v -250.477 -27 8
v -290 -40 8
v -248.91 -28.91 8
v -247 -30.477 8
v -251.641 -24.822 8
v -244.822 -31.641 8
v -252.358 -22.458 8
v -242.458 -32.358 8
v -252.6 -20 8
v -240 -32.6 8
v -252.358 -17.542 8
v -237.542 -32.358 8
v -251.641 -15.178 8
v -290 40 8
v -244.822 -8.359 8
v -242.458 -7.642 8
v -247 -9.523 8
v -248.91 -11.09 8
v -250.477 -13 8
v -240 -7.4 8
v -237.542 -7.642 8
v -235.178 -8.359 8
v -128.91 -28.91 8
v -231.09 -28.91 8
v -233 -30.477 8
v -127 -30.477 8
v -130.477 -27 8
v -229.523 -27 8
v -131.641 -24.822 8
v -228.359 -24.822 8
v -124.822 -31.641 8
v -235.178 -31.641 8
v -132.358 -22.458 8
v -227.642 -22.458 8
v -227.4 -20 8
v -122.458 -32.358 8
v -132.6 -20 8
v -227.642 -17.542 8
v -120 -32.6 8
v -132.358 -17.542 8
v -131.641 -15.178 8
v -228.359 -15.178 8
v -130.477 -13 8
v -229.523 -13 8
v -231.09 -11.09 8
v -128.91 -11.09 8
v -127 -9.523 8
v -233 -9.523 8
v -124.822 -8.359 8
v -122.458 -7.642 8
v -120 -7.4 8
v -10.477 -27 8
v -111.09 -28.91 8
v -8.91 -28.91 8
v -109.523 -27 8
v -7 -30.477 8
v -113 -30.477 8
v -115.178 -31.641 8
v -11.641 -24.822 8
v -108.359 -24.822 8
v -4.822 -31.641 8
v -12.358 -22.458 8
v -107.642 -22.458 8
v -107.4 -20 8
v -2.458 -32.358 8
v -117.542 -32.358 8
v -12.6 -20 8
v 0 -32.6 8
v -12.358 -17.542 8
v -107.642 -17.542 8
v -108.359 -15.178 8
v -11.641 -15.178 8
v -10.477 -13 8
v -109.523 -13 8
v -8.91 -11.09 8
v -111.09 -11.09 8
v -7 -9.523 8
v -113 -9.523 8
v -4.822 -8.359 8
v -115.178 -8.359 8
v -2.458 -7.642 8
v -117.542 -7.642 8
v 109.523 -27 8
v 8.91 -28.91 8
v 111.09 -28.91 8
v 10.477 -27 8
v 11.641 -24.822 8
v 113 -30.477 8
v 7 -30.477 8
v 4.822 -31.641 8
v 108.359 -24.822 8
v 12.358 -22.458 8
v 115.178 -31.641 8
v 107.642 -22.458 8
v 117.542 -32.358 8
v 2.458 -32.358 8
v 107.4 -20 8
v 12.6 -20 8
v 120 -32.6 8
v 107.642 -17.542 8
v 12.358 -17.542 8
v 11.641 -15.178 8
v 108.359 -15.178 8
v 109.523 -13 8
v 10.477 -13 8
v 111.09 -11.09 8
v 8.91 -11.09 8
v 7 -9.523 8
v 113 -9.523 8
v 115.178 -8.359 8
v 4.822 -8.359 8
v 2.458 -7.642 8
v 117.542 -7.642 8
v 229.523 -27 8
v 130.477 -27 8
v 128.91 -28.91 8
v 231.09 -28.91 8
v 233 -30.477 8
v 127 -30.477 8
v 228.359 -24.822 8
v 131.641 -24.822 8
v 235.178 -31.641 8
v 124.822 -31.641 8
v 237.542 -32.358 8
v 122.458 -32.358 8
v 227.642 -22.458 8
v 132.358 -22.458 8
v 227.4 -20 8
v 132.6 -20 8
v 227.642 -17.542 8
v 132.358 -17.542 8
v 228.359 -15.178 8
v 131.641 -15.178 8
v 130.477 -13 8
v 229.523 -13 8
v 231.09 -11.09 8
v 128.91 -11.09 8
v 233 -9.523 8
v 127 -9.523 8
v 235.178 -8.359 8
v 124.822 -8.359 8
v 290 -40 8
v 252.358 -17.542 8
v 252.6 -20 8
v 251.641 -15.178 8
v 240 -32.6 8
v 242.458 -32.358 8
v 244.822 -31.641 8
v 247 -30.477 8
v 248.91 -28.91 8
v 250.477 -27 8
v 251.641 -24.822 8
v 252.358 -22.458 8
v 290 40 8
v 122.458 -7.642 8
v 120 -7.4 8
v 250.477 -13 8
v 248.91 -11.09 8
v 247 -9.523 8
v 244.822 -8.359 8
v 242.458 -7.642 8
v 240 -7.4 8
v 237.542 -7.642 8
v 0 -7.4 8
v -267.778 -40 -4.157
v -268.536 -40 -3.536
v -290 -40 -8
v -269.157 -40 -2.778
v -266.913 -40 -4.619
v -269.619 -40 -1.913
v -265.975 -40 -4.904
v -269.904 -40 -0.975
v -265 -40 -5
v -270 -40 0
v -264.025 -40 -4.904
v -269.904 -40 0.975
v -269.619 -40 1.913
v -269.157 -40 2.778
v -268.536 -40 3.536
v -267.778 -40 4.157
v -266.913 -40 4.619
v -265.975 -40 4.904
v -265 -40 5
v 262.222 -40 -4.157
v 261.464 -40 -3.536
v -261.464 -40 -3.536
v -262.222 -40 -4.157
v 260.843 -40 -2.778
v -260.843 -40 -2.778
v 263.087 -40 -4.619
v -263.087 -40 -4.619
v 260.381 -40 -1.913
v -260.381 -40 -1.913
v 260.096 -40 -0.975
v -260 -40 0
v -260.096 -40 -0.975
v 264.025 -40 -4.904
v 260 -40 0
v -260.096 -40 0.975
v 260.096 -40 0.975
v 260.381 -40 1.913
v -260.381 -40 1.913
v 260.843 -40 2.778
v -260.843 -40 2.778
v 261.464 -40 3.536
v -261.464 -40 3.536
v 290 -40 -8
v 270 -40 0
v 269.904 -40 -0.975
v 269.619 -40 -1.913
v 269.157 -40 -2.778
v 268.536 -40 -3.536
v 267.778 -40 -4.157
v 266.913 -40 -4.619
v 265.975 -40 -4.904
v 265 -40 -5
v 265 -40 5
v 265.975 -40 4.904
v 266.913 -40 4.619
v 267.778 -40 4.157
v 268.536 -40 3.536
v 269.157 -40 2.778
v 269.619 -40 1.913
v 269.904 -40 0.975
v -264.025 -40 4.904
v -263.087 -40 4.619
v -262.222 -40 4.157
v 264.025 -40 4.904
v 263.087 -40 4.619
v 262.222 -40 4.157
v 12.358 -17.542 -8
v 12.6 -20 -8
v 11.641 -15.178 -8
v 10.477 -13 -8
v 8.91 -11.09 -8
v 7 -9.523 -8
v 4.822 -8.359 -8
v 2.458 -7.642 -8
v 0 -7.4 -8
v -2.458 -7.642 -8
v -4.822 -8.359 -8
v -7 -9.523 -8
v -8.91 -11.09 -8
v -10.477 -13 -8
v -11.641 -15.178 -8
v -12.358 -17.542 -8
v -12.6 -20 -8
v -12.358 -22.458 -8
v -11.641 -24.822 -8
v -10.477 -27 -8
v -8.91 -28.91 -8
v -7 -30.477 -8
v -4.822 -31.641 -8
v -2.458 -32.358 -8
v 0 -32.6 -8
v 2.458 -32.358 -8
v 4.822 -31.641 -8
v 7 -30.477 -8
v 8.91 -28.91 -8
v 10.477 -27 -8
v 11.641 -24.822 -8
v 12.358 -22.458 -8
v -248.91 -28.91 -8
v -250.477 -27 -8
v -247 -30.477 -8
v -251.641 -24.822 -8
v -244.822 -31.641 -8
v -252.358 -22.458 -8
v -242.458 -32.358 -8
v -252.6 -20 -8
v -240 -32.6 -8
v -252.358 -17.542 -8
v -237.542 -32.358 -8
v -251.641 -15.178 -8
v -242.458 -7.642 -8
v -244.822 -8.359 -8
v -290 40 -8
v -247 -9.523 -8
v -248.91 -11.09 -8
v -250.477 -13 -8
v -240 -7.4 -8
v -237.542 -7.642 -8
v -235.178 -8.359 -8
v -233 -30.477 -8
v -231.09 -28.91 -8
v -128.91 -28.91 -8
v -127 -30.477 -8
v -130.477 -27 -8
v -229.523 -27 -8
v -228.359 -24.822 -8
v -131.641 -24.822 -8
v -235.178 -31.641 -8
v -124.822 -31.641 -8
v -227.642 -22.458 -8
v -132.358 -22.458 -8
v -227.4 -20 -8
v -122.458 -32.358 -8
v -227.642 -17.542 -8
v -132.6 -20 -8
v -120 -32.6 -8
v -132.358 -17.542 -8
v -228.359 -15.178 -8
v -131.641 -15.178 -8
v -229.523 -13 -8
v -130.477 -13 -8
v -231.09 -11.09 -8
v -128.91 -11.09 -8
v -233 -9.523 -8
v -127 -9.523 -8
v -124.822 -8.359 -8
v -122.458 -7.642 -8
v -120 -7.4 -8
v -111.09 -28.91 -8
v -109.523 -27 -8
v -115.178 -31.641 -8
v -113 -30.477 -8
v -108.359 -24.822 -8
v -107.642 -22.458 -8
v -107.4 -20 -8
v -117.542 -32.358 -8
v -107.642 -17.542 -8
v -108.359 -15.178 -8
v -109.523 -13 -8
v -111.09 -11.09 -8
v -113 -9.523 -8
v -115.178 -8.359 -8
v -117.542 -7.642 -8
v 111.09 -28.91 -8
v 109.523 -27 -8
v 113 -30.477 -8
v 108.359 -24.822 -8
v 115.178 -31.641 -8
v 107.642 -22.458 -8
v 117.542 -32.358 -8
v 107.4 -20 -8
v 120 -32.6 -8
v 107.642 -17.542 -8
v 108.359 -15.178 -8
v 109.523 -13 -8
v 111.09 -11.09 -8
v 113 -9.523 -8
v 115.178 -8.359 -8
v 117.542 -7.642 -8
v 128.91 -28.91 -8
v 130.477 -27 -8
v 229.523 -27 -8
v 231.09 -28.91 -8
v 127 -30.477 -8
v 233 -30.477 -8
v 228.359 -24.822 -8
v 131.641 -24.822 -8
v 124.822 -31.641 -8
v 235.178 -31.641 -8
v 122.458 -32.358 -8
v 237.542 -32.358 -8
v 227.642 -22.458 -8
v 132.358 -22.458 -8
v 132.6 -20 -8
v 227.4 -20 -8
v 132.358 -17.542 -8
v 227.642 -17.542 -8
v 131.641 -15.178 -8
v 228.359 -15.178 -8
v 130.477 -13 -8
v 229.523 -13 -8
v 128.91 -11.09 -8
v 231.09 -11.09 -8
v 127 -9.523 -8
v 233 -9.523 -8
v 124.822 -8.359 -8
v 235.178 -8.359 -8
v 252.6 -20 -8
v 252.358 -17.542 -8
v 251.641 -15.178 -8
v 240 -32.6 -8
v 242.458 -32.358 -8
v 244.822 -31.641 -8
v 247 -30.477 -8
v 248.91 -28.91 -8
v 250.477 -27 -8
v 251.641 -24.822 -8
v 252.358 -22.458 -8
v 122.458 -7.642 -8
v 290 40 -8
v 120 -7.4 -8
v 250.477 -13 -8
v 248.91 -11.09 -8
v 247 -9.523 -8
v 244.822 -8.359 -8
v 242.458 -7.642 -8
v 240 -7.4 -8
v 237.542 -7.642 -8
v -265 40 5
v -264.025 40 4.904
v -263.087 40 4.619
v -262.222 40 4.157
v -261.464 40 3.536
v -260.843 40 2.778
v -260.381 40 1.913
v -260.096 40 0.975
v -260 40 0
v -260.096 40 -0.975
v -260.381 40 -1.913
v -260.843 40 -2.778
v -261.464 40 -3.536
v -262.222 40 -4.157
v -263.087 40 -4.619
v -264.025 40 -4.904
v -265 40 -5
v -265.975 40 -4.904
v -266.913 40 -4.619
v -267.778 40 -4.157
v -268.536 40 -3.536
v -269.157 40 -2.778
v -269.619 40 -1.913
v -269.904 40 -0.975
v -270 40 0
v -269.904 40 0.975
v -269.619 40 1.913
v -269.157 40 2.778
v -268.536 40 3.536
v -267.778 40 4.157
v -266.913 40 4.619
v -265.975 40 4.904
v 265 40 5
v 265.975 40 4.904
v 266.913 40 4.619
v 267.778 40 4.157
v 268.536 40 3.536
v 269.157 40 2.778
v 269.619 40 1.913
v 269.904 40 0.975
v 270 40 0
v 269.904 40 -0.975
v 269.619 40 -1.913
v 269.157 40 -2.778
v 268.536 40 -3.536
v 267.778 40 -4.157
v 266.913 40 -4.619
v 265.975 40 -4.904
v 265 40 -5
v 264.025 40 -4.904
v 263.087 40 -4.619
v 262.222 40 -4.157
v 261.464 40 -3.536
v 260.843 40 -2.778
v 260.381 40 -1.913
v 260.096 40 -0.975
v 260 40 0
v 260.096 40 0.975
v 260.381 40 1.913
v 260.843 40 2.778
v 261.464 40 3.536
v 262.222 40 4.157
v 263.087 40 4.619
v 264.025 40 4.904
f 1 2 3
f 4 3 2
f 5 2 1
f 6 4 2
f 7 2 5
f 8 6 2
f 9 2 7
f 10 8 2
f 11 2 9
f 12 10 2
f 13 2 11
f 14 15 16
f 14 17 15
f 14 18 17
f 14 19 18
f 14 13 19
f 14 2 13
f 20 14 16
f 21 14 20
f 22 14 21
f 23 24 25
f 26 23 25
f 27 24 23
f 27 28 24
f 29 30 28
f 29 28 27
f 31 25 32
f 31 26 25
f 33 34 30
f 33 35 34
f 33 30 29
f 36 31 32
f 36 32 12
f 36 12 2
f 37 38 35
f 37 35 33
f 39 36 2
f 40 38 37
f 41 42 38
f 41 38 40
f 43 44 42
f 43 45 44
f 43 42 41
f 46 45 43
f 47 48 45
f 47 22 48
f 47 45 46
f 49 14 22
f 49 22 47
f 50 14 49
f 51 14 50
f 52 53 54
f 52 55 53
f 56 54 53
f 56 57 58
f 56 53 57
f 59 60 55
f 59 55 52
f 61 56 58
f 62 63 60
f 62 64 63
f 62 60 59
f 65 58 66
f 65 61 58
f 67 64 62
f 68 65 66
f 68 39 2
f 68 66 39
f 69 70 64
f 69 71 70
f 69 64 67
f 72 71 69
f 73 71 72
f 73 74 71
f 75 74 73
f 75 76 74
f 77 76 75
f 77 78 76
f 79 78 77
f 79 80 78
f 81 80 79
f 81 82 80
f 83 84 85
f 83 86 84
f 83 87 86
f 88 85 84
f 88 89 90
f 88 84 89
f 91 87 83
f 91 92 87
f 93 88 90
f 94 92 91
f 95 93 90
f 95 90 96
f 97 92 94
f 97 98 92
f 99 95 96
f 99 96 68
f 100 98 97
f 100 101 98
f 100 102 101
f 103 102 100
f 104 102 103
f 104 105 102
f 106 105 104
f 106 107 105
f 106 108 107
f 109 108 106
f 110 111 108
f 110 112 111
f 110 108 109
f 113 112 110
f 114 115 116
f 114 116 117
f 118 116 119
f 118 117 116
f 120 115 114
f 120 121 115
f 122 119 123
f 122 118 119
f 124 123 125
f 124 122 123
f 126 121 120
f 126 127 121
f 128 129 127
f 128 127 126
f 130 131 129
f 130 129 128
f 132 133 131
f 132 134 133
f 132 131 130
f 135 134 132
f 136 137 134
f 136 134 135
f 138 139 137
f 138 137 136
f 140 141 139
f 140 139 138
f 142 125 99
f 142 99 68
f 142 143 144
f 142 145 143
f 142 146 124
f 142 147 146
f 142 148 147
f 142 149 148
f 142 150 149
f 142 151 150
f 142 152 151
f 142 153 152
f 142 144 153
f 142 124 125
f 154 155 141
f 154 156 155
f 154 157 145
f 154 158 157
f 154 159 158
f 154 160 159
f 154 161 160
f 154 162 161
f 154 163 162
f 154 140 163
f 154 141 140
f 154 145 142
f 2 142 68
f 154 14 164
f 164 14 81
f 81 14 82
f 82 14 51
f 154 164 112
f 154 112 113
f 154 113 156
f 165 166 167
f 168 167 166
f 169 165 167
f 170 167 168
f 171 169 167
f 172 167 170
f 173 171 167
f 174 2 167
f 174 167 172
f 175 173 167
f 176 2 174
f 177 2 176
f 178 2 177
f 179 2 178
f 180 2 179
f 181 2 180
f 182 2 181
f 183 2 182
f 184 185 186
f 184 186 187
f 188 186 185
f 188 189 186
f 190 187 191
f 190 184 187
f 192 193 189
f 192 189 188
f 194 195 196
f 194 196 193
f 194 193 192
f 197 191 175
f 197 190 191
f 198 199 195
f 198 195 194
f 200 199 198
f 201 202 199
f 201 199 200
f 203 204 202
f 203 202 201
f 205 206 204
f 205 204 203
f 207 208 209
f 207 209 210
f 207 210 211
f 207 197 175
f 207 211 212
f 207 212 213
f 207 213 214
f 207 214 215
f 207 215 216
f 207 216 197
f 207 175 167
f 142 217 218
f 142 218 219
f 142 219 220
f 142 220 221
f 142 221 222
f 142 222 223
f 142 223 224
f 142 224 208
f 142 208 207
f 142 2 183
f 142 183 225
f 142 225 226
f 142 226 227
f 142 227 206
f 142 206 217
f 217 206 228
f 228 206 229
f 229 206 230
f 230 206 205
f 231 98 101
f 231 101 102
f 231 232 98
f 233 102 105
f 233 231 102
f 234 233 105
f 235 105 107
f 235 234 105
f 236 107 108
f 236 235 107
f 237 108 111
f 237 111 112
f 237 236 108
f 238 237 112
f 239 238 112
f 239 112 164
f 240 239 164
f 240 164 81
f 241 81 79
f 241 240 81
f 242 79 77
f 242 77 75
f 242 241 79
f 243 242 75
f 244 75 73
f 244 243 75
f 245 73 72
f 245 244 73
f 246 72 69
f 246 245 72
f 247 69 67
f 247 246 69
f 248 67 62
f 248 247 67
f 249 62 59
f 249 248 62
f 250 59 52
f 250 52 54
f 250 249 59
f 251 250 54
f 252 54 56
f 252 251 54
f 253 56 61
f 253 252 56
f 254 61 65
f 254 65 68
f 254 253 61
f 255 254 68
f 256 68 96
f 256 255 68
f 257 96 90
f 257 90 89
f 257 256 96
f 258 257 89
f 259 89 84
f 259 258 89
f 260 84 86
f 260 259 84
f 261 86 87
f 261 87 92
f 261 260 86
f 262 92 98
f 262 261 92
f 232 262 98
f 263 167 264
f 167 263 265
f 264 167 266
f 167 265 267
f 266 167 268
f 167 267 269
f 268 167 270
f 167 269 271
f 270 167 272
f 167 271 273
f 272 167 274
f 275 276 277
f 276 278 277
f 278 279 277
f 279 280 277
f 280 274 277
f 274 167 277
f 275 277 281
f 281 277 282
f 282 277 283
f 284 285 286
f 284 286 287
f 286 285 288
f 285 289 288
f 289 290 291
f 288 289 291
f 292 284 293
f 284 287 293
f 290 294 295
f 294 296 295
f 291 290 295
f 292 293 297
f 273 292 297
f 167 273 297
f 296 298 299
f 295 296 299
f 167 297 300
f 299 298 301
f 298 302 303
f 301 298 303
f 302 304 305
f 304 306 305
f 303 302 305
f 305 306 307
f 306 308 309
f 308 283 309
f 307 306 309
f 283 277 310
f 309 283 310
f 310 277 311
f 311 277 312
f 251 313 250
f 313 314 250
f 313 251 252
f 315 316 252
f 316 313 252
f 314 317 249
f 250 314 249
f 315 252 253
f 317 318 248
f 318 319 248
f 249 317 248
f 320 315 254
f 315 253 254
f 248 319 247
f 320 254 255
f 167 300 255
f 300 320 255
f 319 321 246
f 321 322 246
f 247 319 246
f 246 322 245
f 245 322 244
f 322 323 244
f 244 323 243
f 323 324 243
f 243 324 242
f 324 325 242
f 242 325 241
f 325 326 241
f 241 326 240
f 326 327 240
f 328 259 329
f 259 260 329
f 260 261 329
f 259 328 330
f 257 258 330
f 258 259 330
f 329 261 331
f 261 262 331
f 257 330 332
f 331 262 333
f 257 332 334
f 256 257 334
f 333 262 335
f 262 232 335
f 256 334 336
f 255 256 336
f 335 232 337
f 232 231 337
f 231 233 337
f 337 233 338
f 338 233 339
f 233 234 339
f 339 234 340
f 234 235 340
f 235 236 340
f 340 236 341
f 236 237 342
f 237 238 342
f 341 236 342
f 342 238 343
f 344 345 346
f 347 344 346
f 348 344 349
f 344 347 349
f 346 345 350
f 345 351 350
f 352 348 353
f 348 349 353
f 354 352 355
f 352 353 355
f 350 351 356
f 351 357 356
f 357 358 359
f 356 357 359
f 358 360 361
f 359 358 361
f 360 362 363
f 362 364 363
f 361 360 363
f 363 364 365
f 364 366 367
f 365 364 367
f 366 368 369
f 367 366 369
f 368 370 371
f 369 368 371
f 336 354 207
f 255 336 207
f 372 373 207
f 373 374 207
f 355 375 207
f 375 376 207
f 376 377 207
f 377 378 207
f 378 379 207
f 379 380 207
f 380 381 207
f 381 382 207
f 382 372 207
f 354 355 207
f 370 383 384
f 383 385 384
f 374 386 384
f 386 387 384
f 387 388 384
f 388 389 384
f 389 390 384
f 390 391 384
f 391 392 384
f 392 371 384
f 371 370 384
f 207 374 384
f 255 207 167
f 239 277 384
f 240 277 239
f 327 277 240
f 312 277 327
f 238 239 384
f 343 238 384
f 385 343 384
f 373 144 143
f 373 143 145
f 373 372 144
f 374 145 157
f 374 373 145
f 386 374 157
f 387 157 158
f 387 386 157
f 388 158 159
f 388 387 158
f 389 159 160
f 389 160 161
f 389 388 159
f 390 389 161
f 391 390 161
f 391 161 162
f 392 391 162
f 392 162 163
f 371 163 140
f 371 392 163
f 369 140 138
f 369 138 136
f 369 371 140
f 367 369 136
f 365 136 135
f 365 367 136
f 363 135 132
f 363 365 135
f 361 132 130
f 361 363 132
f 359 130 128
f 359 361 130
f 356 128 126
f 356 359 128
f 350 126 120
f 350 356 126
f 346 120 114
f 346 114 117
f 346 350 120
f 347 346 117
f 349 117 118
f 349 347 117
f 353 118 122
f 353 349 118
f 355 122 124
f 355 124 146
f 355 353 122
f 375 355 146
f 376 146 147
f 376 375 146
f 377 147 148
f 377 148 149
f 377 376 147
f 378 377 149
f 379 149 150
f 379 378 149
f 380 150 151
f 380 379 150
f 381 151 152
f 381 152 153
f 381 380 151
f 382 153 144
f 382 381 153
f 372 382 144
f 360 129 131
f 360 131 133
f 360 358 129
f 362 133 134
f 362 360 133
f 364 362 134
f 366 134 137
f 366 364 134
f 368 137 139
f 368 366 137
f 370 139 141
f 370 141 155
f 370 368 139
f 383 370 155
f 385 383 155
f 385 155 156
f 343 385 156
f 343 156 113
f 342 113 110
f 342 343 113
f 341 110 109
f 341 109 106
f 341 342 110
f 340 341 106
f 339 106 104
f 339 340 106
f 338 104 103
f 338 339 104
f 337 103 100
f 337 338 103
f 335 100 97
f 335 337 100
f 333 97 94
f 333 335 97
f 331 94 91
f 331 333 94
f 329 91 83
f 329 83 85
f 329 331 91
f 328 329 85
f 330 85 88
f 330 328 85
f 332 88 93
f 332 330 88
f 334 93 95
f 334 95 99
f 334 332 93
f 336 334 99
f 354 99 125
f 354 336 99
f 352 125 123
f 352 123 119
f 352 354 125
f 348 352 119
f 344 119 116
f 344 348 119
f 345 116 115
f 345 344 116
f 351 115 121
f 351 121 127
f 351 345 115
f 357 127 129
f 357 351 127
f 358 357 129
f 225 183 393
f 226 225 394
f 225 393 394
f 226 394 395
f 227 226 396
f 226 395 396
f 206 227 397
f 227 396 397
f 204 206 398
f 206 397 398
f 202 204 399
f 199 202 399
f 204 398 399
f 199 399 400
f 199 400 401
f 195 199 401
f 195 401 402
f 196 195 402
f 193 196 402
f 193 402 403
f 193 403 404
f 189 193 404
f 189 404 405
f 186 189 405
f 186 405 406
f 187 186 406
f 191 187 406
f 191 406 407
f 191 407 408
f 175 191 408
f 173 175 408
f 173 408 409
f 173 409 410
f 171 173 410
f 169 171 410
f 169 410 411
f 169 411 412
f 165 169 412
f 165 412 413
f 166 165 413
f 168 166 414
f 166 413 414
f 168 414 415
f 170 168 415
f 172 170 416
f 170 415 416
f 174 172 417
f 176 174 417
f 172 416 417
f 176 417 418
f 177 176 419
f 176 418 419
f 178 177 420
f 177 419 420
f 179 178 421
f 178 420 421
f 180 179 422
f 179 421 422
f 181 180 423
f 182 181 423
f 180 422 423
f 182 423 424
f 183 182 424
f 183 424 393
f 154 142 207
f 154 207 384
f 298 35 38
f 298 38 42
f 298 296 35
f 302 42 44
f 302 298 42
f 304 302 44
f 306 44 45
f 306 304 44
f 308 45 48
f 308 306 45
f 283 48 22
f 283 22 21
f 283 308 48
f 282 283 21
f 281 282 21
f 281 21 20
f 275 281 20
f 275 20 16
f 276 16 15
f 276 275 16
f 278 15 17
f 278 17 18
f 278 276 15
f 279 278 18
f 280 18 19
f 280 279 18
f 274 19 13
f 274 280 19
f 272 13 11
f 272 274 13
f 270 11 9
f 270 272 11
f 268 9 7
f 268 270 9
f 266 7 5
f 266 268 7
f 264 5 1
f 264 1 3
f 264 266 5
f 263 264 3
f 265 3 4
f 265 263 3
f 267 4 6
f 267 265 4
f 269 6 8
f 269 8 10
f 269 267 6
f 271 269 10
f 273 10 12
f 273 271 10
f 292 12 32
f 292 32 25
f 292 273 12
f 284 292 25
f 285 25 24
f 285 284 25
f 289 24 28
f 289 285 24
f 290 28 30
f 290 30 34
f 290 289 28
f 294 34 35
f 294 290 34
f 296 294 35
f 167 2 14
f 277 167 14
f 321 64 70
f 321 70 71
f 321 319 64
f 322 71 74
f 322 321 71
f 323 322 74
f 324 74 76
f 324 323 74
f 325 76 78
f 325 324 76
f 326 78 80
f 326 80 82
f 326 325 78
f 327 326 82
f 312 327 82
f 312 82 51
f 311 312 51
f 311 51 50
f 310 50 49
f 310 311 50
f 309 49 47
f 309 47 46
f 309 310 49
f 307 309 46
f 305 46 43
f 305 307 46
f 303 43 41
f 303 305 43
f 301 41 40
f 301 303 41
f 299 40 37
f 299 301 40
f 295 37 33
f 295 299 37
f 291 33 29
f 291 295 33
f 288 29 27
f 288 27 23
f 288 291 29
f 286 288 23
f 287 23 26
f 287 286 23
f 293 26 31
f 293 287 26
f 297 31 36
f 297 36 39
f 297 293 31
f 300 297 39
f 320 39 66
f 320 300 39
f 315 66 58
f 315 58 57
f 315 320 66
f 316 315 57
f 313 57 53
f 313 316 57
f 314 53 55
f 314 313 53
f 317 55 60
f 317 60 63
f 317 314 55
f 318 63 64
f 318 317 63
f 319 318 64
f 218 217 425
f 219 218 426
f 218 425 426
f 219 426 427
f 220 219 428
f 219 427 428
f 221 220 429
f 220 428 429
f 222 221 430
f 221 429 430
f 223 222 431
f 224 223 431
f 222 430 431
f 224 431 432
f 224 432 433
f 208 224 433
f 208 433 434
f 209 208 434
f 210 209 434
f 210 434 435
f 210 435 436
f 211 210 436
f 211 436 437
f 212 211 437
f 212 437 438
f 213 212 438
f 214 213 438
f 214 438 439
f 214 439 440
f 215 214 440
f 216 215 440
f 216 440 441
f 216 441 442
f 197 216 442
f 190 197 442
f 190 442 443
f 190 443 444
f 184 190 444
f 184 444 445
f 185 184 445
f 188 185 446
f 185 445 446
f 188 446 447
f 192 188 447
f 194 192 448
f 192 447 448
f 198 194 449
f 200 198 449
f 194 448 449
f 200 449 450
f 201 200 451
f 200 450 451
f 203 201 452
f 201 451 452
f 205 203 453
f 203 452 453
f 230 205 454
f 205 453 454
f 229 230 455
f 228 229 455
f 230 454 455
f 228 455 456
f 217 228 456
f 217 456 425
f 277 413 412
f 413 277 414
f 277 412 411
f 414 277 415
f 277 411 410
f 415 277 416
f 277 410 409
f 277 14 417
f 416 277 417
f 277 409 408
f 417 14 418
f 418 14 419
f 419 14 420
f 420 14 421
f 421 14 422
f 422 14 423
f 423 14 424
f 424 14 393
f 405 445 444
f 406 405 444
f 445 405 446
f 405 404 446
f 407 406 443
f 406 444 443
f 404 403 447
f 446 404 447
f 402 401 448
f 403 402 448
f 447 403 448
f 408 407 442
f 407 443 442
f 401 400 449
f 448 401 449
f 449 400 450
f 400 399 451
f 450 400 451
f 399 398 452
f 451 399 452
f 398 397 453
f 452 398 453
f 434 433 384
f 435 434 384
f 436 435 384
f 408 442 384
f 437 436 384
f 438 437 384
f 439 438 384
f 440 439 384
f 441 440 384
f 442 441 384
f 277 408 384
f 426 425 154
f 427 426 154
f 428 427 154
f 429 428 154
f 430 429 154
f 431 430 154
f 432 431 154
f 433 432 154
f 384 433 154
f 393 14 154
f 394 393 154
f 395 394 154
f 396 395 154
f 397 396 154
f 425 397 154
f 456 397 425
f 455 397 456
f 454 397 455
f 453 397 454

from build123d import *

# Parameters (mm, degrees)
SKETCH1_W           = 580
SKETCH1_H           = 80
SKETCH1_R           = 12.6
BOSS_EXTRUDE1_DEPTH = 8
SKETCH2_R           = 5
CUT_EXTRUDE1_DEPTH  = 301.93853193


with BuildPart() as part:
    # Sketch1 → Boss-Extrude1 (new, symmetric)
    with BuildSketch(Plane.XY):
        Rectangle(SKETCH1_W, SKETCH1_H)
        with Locations((-240, -20)):
            Circle(SKETCH1_R, mode=Mode.SUBTRACT)
        with Locations((-120, -20)):
            Circle(SKETCH1_R, mode=Mode.SUBTRACT)
        with Locations((0, -20)):
            Circle(SKETCH1_R, mode=Mode.SUBTRACT)
        with Locations((120, -20)):
            Circle(SKETCH1_R, mode=Mode.SUBTRACT)
        with Locations((240, -20)):
            Circle(SKETCH1_R, mode=Mode.SUBTRACT)
    extrude(amount=BOSS_EXTRUDE1_DEPTH, both=True)

    # Sketch2 → Cut-Extrude1 (cut, through all)
    with BuildSketch(Plane(origin=(0, 40, 0), x_dir=(1, 0, 0), z_dir=(0, 1, 0))):
        with Locations((-265, 0)):
            Circle(SKETCH2_R)
        with Locations((265, 0)):
            Circle(SKETCH2_R)
    extrude(amount=-CUT_EXTRUDE1_DEPTH, mode=Mode.SUBTRACT)


solid = part.part
